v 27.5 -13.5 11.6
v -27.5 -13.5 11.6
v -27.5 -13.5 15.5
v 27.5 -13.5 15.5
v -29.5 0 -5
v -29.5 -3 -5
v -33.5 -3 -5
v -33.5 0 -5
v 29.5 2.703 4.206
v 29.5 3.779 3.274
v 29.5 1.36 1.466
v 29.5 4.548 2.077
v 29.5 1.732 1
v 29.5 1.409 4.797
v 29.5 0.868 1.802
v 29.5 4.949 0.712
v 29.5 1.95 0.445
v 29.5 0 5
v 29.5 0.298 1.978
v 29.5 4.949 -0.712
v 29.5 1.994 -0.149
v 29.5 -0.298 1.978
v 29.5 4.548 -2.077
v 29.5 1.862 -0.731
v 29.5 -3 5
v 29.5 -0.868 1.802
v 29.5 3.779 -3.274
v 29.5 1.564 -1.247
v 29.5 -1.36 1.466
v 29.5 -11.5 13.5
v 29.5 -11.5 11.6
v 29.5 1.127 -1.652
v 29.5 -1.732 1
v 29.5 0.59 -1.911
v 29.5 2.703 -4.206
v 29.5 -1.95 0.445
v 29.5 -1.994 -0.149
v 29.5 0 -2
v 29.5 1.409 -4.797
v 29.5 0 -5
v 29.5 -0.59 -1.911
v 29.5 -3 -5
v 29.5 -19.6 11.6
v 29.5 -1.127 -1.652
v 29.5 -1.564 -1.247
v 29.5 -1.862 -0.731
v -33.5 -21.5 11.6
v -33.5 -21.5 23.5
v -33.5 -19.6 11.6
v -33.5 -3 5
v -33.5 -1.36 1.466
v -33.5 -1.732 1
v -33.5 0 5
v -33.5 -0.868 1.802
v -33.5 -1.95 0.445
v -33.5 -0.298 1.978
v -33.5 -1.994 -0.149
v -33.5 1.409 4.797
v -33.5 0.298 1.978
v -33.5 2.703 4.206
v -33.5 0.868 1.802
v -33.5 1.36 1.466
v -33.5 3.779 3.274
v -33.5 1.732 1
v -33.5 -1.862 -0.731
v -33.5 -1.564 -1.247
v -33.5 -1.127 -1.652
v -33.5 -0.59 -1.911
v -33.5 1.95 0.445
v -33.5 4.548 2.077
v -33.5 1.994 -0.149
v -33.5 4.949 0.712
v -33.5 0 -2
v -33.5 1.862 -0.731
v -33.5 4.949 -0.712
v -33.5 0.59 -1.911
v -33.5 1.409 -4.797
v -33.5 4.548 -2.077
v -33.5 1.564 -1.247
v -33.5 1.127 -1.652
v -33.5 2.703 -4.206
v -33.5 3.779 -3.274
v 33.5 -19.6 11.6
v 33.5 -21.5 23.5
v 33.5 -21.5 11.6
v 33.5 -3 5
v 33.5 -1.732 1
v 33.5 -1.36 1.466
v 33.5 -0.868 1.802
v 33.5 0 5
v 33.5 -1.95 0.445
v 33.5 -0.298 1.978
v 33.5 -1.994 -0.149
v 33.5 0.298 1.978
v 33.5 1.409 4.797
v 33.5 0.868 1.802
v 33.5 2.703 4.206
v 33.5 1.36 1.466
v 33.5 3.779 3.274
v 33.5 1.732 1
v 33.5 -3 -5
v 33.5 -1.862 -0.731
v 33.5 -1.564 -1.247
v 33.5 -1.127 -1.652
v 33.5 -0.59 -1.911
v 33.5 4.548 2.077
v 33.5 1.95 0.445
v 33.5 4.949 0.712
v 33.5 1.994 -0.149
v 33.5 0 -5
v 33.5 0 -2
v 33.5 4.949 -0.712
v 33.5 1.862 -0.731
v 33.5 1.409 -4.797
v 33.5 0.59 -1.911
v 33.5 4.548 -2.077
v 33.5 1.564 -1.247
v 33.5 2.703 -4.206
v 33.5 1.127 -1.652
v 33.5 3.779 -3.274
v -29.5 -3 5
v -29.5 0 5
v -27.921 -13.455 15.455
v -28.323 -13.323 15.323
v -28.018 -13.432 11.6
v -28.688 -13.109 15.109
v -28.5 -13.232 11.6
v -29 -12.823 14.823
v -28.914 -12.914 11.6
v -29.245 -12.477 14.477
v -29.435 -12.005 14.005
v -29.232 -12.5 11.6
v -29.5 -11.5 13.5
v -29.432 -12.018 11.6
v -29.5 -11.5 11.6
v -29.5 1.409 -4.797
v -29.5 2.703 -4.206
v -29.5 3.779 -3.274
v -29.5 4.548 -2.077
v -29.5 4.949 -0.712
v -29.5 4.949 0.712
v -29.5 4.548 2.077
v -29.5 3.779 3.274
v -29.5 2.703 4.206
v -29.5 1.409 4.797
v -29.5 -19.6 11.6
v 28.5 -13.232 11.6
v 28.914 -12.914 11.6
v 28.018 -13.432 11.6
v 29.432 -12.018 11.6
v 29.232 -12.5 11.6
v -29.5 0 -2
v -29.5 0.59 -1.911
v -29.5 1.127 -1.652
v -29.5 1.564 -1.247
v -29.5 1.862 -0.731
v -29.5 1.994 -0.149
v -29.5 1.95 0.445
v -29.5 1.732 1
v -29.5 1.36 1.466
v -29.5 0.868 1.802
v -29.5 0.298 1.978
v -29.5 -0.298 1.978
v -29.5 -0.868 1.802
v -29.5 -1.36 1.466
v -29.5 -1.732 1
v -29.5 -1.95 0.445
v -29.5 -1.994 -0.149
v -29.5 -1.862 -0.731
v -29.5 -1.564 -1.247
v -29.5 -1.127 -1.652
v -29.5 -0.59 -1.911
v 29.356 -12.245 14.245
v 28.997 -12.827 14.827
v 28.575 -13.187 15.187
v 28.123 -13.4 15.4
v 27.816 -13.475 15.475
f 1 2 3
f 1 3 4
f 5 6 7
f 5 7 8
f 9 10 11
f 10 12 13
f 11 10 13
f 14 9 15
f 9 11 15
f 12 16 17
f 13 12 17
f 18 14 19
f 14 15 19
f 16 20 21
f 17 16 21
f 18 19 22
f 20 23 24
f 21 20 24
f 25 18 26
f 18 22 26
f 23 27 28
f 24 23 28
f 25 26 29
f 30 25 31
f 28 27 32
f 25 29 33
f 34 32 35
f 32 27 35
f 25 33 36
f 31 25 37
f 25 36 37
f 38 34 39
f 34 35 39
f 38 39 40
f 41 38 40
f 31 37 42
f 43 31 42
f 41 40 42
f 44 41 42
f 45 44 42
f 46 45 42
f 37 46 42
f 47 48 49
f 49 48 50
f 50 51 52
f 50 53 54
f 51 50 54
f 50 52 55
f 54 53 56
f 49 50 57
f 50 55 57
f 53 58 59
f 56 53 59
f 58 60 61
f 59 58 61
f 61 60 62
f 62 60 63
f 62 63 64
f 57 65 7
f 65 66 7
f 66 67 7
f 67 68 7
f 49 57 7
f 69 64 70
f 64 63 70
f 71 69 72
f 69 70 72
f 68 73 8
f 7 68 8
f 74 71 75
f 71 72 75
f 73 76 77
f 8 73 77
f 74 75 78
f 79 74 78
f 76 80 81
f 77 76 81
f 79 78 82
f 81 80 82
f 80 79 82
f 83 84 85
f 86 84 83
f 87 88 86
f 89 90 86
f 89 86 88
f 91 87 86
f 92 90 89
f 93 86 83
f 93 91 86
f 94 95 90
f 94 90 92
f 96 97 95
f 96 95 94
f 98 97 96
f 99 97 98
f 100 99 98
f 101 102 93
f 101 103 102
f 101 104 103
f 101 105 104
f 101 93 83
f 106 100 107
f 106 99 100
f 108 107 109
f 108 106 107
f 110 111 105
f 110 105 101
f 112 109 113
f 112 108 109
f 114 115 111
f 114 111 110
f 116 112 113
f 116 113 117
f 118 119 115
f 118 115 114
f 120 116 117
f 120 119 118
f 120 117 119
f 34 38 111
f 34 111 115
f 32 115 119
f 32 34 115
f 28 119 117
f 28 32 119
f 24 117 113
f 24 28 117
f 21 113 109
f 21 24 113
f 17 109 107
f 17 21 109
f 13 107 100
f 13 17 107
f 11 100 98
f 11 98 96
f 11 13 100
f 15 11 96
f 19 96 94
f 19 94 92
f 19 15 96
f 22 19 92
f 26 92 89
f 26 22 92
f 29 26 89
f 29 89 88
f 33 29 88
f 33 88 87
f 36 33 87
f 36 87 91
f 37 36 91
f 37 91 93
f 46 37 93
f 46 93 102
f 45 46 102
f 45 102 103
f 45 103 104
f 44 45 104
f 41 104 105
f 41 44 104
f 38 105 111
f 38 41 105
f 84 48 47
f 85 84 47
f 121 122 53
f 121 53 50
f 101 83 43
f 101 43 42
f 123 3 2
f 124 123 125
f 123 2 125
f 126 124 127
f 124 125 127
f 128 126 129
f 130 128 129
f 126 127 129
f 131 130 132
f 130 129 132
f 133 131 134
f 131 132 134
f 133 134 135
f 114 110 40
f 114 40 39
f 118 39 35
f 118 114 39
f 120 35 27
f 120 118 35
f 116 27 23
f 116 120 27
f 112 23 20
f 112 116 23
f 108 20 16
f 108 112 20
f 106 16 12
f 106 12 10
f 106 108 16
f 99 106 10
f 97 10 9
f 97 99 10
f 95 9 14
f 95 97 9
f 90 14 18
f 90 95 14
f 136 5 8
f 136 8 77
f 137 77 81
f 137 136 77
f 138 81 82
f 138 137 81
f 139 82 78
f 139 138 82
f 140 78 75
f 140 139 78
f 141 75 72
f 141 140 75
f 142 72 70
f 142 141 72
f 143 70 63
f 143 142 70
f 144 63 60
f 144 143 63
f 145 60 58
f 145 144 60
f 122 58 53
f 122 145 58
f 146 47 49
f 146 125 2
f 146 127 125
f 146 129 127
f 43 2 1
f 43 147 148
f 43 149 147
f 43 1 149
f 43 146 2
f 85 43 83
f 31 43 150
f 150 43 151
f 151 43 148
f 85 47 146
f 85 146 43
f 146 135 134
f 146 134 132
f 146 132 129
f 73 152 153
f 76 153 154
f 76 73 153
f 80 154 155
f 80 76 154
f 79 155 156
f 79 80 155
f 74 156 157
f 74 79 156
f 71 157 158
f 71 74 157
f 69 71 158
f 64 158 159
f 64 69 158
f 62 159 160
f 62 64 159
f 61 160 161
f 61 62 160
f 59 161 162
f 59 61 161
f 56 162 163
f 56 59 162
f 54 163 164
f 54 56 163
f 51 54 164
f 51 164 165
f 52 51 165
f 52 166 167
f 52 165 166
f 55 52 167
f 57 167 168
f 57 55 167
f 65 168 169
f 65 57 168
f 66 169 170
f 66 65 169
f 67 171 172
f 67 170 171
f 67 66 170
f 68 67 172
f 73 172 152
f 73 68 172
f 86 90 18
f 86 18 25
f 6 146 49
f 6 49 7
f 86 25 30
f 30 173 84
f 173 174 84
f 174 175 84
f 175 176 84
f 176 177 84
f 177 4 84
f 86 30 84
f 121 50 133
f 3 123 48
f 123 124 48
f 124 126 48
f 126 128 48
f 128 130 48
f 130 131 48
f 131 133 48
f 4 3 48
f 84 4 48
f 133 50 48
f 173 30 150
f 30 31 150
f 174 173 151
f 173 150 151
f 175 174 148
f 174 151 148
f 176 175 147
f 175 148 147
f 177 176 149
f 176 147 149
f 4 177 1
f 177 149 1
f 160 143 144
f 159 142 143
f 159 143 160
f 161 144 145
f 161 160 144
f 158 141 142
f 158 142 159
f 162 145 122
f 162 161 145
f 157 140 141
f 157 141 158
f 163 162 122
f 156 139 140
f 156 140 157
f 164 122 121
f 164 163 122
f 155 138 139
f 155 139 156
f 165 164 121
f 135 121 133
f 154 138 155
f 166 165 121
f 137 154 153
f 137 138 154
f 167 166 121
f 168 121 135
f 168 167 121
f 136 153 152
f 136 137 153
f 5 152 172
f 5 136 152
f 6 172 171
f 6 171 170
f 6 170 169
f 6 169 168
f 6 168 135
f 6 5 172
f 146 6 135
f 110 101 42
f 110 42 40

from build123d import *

# Parameters (mm, degrees)
ESBO_O1_R                  = 2
RESSALTO_EXTRUS_O1_DEPTH   = 33.5
CORTE_EXTRUS_O3_START      = -5
CORTE_EXTRUS_O3_DEPTH      = 23.196699141
CORTE_EXTRUS_O4_DEPTH      = 47.084705336
CORTE_EXTRUS_O4_DEPTH_BACK = 47.084705336
ESBO_O4_W                  = 59
ESBO_O4_H                  = 6.231727984
CORTE_EXTRUS_O5_DEPTH      = 44.128413036
RESSALTO_EXTRUS_O3_START   = -29.398953743
RESSALTO_EXTRUS_O3_DEPTH   = 58.797908802
ESBO_O6_W                  = 59
ESBO_O6_H                  = 4.4
RESSALTO_EXTRUS_O4_DEPTH   = 0.5
CORTE_EXTRUS_O6_DEPTH      = 71.593909086
FILETE1_R                  = 2


# Read off the part's stored shape, not the designer's step: Corte-extrusão3, Ressalto-extrusão3
with BuildPart() as part:
    # Esboço1 → Ressalto-extrusão1 (new, symmetric)
    with BuildSketch(Plane(origin=(0, 0, 0), x_dir=(0, 0, -1), z_dir=(1, 0, 0))):
        with BuildLine():
            Line((-5, 0), (-5, -3))
            Line((-5, -3), (-23.5, -21.5))
            Line((-23.5, -21.5), (-11.6, -21.5))
            Line((-11.6, -21.5), (-11.6, -19.6))
            Line((-11.6, -19.6), (5, -3))
            Line((5, -3), (5, 0))
            ThreePointArc((5, 0), (0, 5), (-5, 0))
        make_face()
        Circle(ESBO_O1_R, mode=Mode.SUBTRACT)
    extrude(amount=RESSALTO_EXTRUS_O1_DEPTH, both=True)

    # Corte-extrusão3 outline → Corte-extrusão3 (cut)
    with BuildSketch(Plane.XY.offset(CORTE_EXTRUS_O3_START)):
        with BuildLine():
            Line((-25.5, -16.196699141), (25.5, -16.196699141))
            add(Edge.make_bspline(
                [(25.5, -16.196699141), (29.5, -16.196699141), (29.5, -13.368272016)],
                knots=[3.141592654, 3.141592654, 3.141592654, 4.71238898, 4.71238898, 4.71238898], degree=2, weights=[1, 0.707106781, 1]))
            Line((29.5, -13.368272016), (29.5, 6))
            Line((29.5, 6), (-29.5, 6))
            Line((-29.5, 6), (-29.5, -13.368272016))
            add(Edge.make_bspline(
                [(-29.5, -13.368272016), (-29.5, -16.196699141), (-25.5, -16.196699141)],
                knots=[4.71238898, 4.71238898, 4.71238898, 6.283185307, 6.283185307, 6.283185307], degree=2, weights=[1, 0.707106781, 1]))
        make_face()
    extrude(amount=CORTE_EXTRUS_O3_DEPTH, mode=Mode.SUBTRACT)

    # Esboço4 → Corte-extrusão4 (cut, two sides: drawn at the far end of the back side and taken through both)
    with BuildSketch(Plane(origin=(0, -16.196699141, 0), x_dir=(1, 0, 0), z_dir=(0, 1, 0)).offset(-CORTE_EXTRUS_O4_DEPTH_BACK)):
        with Locations((0, -8.484136008)):
            Rectangle(ESBO_O4_W, ESBO_O4_H)
    extrude(amount=CORTE_EXTRUS_O4_DEPTH + CORTE_EXTRUS_O4_DEPTH_BACK, mode=Mode.SUBTRACT)

    # Esboço5 → Corte-extrusão5 (cut, through all)
    with BuildSketch(Plane(origin=(0, 0, 11.6), x_dir=(-1, 0, 0), z_dir=(0, 0, -1))):
        with BuildLine():
            Line((29.398953619, -14), (29.5, -14))
            Line((29.5, -14), (29.5, -13.368272016))
            add(Edge.make_bspline(
                [(29.398953619, -14), (29.423863493, -13.923129609), (29.445428126, -13.845331175), (29.463538827, -13.766752142), (29.478105641, -13.68755334), (29.489060697, -13.607909452), (29.49636233, -13.528009486), (29.5, -13.448057281), (29.5, -13.368272016)],
                knots=[0.878269136, 0.878269136, 0.878269136, 0.878269136, 0.878269136, 0.878269136, 0.878269136, 0.878269136, 0.878269136, 1, 1, 1, 1, 1, 1, 1, 1, 1], degree=8))
        make_face()
        with BuildLine():
            Line((-29.5, -14), (-29.39895364, -14))
            add(Edge.make_bspline(
                [(-29.5, -13.368272016), (-29.5, -13.38237401), (-29.499886362, -13.396480452), (-29.499658961, -13.410590284), (-29.499317701, -13.424702445), (-29.498862515, -13.438815874), (-29.498293368, -13.452929509), (-29.497610253, -13.467042285), (-29.493100454, -13.546882135), (-29.48691474, -13.612580226), (-29.478257806, -13.678128457), (-29.467147216, -13.743415855), (-29.45361408, -13.808339118), (-29.437701062, -13.872802316), (-29.419460639, -13.936716614), (-29.39895364, -14)],
                knots=[0, 0, 0, 0, 0, 0, 0, 0, 0, 0.021519038, 0.021519038, 0.021519038, 0.021519038, 0.021519038, 0.021519038, 0.021519038, 0.121755683, 0.121755683, 0.121755683, 0.121755683, 0.121755683, 0.121755683, 0.121755683, 0.121755683, 0.121755683], degree=8))
            Line((-29.5, -13.368272016), (-29.5, -14))
        make_face()
    extrude(amount=-CORTE_EXTRUS_O5_DEPTH, mode=Mode.SUBTRACT)

    # Ressalto-extrusão3 outline → Ressalto-extrusão3 (add)
    with BuildSketch(Plane.YZ.offset(RESSALTO_EXTRUS_O3_START)):
        Polygon((-14, 16), (-16.196699141, 18.196699141), (-16.196699141, 11.6), (-14, 11.6), align=None)
    extrude(amount=RESSALTO_EXTRUS_O3_DEPTH)

    # Esboço6 → Ressalto-extrusão4 (add)
    with BuildSketch(Plane(origin=(0, -14, 0), x_dir=(1, 0, 0), z_dir=(0, 1, 0))):
        with Locations((0, -13.8)):
            Rectangle(ESBO_O6_W, ESBO_O6_H)
    extrude(amount=RESSALTO_EXTRUS_O4_DEPTH)

    # Esboço7 → Corte-extrusão6 (cut, through all)
    with BuildSketch(Plane.ZY.offset(29.5)):
        Polygon((16, -13.5), (15.5, -13.5), (16, -14), align=None)
    extrude(amount=-CORTE_EXTRUS_O6_DEPTH, mode=Mode.SUBTRACT)

    # Filete1
    filete1_edges = [part.edges().sort_by_distance(p)[0] for p in [
        (29.5, -13.5, 13.55),
        (-29.5, -13.5, 13.55),
    ]]
    fillet(filete1_edges, radius=FILETE1_R)


solid = part.part
